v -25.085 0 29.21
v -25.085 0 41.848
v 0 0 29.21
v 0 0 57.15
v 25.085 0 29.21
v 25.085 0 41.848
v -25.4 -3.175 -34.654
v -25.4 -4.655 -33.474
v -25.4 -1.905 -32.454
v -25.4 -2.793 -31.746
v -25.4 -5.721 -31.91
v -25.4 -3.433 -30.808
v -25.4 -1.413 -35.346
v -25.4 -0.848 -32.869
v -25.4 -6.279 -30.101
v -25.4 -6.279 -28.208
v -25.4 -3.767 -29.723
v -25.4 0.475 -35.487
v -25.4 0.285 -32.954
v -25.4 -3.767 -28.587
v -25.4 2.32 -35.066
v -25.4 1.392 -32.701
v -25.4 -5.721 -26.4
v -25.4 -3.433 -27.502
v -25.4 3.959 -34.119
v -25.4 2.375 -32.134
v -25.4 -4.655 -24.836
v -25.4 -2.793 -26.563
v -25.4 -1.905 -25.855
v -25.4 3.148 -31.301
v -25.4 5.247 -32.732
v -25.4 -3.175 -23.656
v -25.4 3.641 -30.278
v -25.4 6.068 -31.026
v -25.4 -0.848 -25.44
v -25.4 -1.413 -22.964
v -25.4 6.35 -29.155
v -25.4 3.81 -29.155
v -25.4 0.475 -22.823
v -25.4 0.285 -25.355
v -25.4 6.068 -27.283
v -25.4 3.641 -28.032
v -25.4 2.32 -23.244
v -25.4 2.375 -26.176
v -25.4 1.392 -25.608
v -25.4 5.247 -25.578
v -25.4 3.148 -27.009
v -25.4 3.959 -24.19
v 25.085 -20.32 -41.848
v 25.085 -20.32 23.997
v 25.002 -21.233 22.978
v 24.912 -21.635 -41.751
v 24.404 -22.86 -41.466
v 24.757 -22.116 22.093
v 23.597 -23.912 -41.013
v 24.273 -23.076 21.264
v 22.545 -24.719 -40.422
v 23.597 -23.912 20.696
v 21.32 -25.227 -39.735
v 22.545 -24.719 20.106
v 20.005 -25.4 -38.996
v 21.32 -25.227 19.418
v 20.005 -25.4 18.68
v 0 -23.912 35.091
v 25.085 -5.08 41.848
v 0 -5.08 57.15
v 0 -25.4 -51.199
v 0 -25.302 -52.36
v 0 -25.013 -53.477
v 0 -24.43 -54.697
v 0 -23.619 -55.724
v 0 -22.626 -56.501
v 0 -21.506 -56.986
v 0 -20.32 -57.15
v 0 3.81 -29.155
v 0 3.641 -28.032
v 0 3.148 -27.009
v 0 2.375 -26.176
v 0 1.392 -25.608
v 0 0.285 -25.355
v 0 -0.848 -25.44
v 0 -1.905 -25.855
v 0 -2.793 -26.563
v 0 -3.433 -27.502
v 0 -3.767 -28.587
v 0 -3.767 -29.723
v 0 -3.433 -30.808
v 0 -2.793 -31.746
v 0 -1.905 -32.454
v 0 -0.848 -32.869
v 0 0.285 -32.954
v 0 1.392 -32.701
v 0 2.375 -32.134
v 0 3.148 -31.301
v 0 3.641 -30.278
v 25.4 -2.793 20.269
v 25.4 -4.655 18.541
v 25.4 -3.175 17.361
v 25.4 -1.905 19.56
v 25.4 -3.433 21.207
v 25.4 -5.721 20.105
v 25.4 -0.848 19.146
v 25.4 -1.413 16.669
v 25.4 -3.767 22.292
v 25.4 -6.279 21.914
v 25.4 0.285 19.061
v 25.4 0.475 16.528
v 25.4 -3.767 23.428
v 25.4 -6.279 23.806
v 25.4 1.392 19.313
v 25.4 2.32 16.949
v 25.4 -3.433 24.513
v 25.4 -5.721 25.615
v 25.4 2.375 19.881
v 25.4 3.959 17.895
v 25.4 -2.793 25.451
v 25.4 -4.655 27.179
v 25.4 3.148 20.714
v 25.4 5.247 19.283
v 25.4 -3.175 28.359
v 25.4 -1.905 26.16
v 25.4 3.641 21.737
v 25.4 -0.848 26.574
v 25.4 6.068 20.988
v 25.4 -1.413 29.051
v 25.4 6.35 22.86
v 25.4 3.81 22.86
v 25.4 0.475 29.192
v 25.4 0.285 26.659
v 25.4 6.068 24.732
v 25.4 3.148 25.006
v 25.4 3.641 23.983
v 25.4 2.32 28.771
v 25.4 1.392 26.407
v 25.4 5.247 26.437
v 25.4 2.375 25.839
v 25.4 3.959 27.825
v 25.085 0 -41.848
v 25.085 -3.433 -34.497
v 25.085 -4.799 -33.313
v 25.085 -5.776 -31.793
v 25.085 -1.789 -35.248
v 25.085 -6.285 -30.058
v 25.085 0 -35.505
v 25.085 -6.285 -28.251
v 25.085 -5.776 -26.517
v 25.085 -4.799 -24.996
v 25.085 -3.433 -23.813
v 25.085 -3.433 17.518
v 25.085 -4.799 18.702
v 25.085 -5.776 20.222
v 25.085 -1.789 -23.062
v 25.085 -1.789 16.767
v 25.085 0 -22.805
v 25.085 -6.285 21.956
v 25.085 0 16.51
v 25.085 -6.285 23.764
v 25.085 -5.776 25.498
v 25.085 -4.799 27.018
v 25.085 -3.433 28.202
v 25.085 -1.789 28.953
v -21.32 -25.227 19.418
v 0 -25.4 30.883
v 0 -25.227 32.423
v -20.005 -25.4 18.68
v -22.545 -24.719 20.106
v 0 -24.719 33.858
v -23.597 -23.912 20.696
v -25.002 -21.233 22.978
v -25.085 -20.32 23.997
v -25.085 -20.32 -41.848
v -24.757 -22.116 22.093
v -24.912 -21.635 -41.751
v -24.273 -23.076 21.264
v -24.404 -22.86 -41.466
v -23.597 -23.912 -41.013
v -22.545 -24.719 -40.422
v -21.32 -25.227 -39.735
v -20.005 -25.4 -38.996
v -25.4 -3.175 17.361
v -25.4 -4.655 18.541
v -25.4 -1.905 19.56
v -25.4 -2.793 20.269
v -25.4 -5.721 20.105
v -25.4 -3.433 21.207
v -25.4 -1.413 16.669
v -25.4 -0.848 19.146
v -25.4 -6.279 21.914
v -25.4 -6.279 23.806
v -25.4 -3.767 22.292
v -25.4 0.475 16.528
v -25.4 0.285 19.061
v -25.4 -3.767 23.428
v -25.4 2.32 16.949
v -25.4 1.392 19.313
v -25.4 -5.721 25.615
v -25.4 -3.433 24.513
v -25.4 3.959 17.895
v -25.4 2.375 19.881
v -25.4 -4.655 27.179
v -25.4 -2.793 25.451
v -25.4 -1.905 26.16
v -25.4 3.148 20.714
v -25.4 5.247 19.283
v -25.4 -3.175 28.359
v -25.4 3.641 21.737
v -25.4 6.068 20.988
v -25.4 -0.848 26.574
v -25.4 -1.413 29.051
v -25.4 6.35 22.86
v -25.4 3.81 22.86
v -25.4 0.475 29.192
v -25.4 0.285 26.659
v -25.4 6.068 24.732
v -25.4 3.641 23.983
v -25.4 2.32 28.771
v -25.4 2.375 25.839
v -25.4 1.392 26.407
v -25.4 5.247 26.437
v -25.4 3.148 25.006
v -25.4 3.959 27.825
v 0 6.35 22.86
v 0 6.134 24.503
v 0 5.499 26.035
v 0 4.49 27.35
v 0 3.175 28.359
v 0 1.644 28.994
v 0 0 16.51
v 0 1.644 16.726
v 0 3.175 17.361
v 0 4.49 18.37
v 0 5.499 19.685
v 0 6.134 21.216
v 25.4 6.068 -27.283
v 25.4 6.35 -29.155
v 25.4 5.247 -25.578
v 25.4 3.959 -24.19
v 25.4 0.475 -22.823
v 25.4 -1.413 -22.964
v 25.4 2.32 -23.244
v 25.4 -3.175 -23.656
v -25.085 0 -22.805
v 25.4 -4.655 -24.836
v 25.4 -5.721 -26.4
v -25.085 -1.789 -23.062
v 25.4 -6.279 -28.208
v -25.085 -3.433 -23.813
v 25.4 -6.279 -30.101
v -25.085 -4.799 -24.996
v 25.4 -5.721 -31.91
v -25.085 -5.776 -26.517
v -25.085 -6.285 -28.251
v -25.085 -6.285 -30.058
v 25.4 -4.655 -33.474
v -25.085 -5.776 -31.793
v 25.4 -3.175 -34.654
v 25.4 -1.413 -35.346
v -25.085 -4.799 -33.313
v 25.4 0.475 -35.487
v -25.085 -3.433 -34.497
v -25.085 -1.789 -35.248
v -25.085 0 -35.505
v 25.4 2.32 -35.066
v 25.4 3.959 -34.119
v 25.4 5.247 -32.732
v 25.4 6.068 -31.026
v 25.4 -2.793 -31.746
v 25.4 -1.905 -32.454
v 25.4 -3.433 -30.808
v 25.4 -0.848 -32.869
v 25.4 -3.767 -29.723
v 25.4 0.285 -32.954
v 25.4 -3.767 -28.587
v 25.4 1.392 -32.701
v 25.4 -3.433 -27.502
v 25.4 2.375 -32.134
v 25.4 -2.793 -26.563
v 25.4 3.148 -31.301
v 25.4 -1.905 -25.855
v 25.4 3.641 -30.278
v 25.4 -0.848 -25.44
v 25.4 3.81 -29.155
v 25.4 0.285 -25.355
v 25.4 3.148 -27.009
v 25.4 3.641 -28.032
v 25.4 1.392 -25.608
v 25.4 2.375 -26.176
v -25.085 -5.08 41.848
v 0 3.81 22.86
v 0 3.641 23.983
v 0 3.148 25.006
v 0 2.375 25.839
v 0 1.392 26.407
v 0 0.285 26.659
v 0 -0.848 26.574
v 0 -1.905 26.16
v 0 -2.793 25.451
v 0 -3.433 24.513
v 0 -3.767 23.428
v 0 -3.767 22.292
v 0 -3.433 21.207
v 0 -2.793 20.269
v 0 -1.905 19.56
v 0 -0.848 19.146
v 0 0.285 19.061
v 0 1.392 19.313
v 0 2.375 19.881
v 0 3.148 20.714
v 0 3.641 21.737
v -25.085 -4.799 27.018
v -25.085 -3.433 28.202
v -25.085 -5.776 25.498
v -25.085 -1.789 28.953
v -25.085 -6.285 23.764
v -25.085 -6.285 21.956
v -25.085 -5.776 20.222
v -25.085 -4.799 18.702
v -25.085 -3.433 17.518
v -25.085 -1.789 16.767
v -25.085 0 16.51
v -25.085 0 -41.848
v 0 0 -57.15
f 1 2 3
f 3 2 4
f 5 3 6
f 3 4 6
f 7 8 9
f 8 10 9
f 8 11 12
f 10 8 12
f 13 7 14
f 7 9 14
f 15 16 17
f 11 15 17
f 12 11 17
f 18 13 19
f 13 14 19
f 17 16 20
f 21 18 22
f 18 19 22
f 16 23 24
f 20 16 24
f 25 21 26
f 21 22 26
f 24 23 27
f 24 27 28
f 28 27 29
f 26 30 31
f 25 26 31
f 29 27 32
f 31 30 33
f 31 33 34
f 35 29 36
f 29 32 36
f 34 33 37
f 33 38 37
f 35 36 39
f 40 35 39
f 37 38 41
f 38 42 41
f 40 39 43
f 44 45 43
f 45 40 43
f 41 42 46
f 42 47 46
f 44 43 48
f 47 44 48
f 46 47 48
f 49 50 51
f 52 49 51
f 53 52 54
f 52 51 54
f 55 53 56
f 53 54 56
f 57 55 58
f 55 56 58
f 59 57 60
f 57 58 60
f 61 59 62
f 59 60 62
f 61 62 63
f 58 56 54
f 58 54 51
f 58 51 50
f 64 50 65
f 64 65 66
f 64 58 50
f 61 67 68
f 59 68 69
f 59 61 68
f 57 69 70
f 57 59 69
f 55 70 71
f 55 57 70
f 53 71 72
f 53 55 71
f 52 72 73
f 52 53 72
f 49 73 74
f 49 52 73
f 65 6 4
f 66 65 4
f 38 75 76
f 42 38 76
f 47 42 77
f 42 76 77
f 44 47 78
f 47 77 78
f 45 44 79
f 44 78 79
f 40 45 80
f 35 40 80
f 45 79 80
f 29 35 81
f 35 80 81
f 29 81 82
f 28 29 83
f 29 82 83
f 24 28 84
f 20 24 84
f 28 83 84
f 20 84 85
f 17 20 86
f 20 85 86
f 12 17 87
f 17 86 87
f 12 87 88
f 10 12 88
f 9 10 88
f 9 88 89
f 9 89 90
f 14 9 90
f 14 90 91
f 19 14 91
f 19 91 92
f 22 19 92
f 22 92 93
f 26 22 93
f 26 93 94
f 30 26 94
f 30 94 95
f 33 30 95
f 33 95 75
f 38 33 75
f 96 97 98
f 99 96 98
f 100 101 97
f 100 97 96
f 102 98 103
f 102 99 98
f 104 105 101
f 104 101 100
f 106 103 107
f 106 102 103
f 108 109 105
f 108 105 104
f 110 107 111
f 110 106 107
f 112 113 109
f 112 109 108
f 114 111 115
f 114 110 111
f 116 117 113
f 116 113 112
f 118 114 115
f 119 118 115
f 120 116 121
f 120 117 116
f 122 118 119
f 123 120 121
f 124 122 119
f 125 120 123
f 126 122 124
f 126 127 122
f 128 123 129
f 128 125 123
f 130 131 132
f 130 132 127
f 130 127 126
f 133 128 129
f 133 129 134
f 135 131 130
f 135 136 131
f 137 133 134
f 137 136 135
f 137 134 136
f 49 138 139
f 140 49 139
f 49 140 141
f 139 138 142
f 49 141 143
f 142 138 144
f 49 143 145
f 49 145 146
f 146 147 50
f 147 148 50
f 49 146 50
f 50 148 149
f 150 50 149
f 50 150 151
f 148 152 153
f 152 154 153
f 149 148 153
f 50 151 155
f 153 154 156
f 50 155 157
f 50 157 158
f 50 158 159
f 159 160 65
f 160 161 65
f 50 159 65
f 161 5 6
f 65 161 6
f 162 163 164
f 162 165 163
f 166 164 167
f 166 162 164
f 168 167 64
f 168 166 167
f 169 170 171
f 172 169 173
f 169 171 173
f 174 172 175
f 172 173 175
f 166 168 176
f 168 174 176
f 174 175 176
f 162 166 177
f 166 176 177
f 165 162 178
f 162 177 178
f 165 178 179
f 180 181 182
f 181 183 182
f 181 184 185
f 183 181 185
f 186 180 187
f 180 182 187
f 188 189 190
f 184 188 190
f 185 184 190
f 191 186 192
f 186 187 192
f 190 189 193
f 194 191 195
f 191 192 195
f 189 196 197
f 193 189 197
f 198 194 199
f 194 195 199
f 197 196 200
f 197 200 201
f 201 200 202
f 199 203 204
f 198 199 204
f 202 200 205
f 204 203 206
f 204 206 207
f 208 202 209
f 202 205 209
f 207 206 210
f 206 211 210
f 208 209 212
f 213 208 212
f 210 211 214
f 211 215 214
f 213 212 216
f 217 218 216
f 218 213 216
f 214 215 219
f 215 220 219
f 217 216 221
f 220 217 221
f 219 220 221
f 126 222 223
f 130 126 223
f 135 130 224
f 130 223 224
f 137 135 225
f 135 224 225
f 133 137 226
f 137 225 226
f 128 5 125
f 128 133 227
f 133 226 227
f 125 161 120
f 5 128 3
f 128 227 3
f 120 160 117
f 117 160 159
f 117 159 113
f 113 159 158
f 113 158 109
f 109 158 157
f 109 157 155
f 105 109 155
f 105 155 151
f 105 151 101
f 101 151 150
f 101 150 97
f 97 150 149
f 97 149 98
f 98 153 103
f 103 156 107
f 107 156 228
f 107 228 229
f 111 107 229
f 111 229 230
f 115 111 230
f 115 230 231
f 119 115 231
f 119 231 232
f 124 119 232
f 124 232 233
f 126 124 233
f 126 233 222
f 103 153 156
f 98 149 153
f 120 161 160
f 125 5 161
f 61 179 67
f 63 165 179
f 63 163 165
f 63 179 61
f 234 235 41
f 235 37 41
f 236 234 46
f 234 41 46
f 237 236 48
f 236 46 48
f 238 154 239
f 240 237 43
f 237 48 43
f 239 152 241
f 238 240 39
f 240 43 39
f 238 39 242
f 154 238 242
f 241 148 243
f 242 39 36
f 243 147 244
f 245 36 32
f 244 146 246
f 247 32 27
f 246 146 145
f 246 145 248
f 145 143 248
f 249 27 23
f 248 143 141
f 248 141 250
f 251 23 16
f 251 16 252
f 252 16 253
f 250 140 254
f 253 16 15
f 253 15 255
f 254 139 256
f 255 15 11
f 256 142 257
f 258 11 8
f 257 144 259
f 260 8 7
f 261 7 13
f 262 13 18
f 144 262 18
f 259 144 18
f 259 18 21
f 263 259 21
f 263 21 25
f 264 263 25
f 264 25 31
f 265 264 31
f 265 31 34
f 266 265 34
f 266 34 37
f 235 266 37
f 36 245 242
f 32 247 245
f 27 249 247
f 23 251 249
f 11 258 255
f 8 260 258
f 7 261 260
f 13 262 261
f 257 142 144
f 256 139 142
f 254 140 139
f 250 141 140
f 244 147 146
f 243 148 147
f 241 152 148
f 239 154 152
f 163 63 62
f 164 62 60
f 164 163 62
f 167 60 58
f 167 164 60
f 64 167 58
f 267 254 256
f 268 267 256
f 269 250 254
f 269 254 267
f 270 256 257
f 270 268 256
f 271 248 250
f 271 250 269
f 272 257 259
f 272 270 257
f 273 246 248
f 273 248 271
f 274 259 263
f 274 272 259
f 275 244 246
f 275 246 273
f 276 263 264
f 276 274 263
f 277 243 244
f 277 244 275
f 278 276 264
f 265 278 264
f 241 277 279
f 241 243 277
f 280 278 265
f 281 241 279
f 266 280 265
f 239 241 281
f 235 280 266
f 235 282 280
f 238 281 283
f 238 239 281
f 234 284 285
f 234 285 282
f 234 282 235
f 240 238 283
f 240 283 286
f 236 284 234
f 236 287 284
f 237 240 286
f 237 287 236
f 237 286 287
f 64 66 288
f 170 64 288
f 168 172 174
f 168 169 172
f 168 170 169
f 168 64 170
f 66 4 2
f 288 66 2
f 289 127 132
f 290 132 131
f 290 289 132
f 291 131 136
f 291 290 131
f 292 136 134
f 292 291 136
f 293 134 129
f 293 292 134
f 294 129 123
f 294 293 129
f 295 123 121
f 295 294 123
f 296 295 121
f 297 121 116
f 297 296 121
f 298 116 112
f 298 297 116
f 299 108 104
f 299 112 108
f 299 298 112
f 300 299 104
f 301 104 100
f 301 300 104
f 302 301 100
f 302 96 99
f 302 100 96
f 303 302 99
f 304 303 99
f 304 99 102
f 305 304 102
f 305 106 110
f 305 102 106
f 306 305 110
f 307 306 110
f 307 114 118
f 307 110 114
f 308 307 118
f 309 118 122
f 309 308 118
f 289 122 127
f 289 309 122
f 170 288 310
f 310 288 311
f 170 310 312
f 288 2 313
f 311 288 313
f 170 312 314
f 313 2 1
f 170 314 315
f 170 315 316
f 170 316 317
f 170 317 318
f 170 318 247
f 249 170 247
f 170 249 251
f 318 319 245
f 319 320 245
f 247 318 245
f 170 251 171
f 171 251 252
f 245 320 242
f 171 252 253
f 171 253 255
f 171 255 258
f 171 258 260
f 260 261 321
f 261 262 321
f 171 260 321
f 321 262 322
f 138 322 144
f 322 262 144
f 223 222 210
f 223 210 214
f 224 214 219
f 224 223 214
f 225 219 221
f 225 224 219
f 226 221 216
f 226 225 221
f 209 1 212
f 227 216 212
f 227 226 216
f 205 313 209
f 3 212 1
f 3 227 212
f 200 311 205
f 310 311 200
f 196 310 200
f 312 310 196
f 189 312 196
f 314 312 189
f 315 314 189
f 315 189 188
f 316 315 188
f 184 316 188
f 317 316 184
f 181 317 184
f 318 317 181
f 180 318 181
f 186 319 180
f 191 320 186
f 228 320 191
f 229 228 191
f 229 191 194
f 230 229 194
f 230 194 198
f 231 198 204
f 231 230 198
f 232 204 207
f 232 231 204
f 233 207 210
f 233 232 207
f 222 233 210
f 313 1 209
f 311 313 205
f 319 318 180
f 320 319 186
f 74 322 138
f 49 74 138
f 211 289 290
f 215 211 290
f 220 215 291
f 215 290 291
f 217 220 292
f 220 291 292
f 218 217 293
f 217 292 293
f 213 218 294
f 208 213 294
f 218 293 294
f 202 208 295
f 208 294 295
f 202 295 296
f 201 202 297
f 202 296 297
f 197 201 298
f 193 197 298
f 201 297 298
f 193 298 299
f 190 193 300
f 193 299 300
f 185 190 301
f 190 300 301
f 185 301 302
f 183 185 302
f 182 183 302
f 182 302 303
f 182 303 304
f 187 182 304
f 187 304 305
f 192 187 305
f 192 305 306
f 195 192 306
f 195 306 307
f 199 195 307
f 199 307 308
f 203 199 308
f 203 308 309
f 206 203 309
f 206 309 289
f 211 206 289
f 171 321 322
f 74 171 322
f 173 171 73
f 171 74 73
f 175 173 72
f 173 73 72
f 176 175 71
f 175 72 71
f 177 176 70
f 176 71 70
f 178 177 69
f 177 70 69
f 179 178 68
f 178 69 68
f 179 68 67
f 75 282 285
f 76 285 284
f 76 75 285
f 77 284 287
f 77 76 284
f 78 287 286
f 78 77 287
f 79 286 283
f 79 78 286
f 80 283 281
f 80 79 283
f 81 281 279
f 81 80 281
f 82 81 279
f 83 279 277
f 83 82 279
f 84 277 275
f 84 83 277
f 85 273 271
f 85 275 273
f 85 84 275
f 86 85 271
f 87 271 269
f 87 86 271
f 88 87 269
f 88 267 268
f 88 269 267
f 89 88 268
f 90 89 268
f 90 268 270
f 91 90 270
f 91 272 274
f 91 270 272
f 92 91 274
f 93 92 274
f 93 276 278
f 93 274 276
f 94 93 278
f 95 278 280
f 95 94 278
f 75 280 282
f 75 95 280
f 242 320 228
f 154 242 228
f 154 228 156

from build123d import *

# Parameters (mm, degrees)
F1_DEPTH       = 25.4
F2_SIZE        = 20.32
F5_R           = 6.35
F6_DEPTH       = 25.4
F6_DEPTH_BACK  = 25.4
F7_R           = 3.81
F8_DEPTH       = 46.228
F8_DEPTH_BACK  = 55.88
F9_R           = 6.35
F10_DEPTH      = 25.4
F10_DEPTH_BACK = 25.4
F11_R          = 3.81
F12_DEPTH      = 41.402
F12_DEPTH_BACK = 45.212
F13_R          = 5.08


# Not quite as in the source:
# - a feature of the source that left no trace in its solid (it failed there, or was rolled back) is left out


with BuildPart() as f1:
    # F0 (on Front) → F1 (new body)
    with BuildSketch(Plane.XZ):
        Polygon((0, 57.15), (-25.0849546432, 41.8481773181), (-25.0849546432, -41.8481773181), (0, -57.15), (25.0849546432, -41.8481773181), (25.0849546432, 41.8481773181), align=None)
    extrude(amount=F1_DEPTH)

    # F2
    f2_edges = [f1.edges().sort_by_distance(p)[0] for p in [
        (-12.542477, -25.4, 49.499089),
        (12.542477, -25.4, 49.499089),
    ]]
    chamfer(f2_edges, length=F2_SIZE)

    # F5 (on Right) → F6 (join, two sides)
    with BuildSketch(Plane.YZ) as f6_sk:
        with Locations((0, -29.1547831148)):
            Circle(F5_R)
    extrude(amount=-F6_DEPTH)
    extrude(f6_sk.sketch, amount=F6_DEPTH_BACK)

    # F7 (on Right) → F8 (cut, two sides)
    with BuildSketch(Plane.YZ) as f8_sk:
        with Locations((0, -29.1547831148)):
            Circle(F7_R)
    extrude(amount=-F8_DEPTH, mode=Mode.SUBTRACT)
    extrude(f8_sk.sketch, amount=F8_DEPTH_BACK, mode=Mode.SUBTRACT)

    # F9 (on Right) → F10 (join, two sides)
    with BuildSketch(Plane.YZ) as f10_sk:
        with Locations((0, 22.8599980474)):
            Circle(F9_R)
    extrude(amount=F10_DEPTH)
    extrude(f10_sk.sketch, amount=-F10_DEPTH_BACK)

    # F11 (on Right) → F12 (cut, two sides)
    with BuildSketch(Plane.YZ) as f12_sk:
        with Locations((0, 22.8599980474)):
            Circle(F11_R)
    extrude(amount=-F12_DEPTH, mode=Mode.SUBTRACT)
    extrude(f12_sk.sketch, amount=F12_DEPTH_BACK, mode=Mode.SUBTRACT)

    # F13
    f13_edges = [f1.edges().sort_by_distance(p)[0] for p in [
        (-25.084955, -25.4, -11.901086),
        (-12.542477, -25.4, 25.696917),
        (-12.542477, -25.4, -49.499089),
        (12.542477, -25.4, 25.696917),
        (12.542477, -25.4, -49.499089),
        (25.084955, -25.4, -11.901086),
    ]]
    fillet(f13_edges, radius=F13_R)


solid = f1.part
